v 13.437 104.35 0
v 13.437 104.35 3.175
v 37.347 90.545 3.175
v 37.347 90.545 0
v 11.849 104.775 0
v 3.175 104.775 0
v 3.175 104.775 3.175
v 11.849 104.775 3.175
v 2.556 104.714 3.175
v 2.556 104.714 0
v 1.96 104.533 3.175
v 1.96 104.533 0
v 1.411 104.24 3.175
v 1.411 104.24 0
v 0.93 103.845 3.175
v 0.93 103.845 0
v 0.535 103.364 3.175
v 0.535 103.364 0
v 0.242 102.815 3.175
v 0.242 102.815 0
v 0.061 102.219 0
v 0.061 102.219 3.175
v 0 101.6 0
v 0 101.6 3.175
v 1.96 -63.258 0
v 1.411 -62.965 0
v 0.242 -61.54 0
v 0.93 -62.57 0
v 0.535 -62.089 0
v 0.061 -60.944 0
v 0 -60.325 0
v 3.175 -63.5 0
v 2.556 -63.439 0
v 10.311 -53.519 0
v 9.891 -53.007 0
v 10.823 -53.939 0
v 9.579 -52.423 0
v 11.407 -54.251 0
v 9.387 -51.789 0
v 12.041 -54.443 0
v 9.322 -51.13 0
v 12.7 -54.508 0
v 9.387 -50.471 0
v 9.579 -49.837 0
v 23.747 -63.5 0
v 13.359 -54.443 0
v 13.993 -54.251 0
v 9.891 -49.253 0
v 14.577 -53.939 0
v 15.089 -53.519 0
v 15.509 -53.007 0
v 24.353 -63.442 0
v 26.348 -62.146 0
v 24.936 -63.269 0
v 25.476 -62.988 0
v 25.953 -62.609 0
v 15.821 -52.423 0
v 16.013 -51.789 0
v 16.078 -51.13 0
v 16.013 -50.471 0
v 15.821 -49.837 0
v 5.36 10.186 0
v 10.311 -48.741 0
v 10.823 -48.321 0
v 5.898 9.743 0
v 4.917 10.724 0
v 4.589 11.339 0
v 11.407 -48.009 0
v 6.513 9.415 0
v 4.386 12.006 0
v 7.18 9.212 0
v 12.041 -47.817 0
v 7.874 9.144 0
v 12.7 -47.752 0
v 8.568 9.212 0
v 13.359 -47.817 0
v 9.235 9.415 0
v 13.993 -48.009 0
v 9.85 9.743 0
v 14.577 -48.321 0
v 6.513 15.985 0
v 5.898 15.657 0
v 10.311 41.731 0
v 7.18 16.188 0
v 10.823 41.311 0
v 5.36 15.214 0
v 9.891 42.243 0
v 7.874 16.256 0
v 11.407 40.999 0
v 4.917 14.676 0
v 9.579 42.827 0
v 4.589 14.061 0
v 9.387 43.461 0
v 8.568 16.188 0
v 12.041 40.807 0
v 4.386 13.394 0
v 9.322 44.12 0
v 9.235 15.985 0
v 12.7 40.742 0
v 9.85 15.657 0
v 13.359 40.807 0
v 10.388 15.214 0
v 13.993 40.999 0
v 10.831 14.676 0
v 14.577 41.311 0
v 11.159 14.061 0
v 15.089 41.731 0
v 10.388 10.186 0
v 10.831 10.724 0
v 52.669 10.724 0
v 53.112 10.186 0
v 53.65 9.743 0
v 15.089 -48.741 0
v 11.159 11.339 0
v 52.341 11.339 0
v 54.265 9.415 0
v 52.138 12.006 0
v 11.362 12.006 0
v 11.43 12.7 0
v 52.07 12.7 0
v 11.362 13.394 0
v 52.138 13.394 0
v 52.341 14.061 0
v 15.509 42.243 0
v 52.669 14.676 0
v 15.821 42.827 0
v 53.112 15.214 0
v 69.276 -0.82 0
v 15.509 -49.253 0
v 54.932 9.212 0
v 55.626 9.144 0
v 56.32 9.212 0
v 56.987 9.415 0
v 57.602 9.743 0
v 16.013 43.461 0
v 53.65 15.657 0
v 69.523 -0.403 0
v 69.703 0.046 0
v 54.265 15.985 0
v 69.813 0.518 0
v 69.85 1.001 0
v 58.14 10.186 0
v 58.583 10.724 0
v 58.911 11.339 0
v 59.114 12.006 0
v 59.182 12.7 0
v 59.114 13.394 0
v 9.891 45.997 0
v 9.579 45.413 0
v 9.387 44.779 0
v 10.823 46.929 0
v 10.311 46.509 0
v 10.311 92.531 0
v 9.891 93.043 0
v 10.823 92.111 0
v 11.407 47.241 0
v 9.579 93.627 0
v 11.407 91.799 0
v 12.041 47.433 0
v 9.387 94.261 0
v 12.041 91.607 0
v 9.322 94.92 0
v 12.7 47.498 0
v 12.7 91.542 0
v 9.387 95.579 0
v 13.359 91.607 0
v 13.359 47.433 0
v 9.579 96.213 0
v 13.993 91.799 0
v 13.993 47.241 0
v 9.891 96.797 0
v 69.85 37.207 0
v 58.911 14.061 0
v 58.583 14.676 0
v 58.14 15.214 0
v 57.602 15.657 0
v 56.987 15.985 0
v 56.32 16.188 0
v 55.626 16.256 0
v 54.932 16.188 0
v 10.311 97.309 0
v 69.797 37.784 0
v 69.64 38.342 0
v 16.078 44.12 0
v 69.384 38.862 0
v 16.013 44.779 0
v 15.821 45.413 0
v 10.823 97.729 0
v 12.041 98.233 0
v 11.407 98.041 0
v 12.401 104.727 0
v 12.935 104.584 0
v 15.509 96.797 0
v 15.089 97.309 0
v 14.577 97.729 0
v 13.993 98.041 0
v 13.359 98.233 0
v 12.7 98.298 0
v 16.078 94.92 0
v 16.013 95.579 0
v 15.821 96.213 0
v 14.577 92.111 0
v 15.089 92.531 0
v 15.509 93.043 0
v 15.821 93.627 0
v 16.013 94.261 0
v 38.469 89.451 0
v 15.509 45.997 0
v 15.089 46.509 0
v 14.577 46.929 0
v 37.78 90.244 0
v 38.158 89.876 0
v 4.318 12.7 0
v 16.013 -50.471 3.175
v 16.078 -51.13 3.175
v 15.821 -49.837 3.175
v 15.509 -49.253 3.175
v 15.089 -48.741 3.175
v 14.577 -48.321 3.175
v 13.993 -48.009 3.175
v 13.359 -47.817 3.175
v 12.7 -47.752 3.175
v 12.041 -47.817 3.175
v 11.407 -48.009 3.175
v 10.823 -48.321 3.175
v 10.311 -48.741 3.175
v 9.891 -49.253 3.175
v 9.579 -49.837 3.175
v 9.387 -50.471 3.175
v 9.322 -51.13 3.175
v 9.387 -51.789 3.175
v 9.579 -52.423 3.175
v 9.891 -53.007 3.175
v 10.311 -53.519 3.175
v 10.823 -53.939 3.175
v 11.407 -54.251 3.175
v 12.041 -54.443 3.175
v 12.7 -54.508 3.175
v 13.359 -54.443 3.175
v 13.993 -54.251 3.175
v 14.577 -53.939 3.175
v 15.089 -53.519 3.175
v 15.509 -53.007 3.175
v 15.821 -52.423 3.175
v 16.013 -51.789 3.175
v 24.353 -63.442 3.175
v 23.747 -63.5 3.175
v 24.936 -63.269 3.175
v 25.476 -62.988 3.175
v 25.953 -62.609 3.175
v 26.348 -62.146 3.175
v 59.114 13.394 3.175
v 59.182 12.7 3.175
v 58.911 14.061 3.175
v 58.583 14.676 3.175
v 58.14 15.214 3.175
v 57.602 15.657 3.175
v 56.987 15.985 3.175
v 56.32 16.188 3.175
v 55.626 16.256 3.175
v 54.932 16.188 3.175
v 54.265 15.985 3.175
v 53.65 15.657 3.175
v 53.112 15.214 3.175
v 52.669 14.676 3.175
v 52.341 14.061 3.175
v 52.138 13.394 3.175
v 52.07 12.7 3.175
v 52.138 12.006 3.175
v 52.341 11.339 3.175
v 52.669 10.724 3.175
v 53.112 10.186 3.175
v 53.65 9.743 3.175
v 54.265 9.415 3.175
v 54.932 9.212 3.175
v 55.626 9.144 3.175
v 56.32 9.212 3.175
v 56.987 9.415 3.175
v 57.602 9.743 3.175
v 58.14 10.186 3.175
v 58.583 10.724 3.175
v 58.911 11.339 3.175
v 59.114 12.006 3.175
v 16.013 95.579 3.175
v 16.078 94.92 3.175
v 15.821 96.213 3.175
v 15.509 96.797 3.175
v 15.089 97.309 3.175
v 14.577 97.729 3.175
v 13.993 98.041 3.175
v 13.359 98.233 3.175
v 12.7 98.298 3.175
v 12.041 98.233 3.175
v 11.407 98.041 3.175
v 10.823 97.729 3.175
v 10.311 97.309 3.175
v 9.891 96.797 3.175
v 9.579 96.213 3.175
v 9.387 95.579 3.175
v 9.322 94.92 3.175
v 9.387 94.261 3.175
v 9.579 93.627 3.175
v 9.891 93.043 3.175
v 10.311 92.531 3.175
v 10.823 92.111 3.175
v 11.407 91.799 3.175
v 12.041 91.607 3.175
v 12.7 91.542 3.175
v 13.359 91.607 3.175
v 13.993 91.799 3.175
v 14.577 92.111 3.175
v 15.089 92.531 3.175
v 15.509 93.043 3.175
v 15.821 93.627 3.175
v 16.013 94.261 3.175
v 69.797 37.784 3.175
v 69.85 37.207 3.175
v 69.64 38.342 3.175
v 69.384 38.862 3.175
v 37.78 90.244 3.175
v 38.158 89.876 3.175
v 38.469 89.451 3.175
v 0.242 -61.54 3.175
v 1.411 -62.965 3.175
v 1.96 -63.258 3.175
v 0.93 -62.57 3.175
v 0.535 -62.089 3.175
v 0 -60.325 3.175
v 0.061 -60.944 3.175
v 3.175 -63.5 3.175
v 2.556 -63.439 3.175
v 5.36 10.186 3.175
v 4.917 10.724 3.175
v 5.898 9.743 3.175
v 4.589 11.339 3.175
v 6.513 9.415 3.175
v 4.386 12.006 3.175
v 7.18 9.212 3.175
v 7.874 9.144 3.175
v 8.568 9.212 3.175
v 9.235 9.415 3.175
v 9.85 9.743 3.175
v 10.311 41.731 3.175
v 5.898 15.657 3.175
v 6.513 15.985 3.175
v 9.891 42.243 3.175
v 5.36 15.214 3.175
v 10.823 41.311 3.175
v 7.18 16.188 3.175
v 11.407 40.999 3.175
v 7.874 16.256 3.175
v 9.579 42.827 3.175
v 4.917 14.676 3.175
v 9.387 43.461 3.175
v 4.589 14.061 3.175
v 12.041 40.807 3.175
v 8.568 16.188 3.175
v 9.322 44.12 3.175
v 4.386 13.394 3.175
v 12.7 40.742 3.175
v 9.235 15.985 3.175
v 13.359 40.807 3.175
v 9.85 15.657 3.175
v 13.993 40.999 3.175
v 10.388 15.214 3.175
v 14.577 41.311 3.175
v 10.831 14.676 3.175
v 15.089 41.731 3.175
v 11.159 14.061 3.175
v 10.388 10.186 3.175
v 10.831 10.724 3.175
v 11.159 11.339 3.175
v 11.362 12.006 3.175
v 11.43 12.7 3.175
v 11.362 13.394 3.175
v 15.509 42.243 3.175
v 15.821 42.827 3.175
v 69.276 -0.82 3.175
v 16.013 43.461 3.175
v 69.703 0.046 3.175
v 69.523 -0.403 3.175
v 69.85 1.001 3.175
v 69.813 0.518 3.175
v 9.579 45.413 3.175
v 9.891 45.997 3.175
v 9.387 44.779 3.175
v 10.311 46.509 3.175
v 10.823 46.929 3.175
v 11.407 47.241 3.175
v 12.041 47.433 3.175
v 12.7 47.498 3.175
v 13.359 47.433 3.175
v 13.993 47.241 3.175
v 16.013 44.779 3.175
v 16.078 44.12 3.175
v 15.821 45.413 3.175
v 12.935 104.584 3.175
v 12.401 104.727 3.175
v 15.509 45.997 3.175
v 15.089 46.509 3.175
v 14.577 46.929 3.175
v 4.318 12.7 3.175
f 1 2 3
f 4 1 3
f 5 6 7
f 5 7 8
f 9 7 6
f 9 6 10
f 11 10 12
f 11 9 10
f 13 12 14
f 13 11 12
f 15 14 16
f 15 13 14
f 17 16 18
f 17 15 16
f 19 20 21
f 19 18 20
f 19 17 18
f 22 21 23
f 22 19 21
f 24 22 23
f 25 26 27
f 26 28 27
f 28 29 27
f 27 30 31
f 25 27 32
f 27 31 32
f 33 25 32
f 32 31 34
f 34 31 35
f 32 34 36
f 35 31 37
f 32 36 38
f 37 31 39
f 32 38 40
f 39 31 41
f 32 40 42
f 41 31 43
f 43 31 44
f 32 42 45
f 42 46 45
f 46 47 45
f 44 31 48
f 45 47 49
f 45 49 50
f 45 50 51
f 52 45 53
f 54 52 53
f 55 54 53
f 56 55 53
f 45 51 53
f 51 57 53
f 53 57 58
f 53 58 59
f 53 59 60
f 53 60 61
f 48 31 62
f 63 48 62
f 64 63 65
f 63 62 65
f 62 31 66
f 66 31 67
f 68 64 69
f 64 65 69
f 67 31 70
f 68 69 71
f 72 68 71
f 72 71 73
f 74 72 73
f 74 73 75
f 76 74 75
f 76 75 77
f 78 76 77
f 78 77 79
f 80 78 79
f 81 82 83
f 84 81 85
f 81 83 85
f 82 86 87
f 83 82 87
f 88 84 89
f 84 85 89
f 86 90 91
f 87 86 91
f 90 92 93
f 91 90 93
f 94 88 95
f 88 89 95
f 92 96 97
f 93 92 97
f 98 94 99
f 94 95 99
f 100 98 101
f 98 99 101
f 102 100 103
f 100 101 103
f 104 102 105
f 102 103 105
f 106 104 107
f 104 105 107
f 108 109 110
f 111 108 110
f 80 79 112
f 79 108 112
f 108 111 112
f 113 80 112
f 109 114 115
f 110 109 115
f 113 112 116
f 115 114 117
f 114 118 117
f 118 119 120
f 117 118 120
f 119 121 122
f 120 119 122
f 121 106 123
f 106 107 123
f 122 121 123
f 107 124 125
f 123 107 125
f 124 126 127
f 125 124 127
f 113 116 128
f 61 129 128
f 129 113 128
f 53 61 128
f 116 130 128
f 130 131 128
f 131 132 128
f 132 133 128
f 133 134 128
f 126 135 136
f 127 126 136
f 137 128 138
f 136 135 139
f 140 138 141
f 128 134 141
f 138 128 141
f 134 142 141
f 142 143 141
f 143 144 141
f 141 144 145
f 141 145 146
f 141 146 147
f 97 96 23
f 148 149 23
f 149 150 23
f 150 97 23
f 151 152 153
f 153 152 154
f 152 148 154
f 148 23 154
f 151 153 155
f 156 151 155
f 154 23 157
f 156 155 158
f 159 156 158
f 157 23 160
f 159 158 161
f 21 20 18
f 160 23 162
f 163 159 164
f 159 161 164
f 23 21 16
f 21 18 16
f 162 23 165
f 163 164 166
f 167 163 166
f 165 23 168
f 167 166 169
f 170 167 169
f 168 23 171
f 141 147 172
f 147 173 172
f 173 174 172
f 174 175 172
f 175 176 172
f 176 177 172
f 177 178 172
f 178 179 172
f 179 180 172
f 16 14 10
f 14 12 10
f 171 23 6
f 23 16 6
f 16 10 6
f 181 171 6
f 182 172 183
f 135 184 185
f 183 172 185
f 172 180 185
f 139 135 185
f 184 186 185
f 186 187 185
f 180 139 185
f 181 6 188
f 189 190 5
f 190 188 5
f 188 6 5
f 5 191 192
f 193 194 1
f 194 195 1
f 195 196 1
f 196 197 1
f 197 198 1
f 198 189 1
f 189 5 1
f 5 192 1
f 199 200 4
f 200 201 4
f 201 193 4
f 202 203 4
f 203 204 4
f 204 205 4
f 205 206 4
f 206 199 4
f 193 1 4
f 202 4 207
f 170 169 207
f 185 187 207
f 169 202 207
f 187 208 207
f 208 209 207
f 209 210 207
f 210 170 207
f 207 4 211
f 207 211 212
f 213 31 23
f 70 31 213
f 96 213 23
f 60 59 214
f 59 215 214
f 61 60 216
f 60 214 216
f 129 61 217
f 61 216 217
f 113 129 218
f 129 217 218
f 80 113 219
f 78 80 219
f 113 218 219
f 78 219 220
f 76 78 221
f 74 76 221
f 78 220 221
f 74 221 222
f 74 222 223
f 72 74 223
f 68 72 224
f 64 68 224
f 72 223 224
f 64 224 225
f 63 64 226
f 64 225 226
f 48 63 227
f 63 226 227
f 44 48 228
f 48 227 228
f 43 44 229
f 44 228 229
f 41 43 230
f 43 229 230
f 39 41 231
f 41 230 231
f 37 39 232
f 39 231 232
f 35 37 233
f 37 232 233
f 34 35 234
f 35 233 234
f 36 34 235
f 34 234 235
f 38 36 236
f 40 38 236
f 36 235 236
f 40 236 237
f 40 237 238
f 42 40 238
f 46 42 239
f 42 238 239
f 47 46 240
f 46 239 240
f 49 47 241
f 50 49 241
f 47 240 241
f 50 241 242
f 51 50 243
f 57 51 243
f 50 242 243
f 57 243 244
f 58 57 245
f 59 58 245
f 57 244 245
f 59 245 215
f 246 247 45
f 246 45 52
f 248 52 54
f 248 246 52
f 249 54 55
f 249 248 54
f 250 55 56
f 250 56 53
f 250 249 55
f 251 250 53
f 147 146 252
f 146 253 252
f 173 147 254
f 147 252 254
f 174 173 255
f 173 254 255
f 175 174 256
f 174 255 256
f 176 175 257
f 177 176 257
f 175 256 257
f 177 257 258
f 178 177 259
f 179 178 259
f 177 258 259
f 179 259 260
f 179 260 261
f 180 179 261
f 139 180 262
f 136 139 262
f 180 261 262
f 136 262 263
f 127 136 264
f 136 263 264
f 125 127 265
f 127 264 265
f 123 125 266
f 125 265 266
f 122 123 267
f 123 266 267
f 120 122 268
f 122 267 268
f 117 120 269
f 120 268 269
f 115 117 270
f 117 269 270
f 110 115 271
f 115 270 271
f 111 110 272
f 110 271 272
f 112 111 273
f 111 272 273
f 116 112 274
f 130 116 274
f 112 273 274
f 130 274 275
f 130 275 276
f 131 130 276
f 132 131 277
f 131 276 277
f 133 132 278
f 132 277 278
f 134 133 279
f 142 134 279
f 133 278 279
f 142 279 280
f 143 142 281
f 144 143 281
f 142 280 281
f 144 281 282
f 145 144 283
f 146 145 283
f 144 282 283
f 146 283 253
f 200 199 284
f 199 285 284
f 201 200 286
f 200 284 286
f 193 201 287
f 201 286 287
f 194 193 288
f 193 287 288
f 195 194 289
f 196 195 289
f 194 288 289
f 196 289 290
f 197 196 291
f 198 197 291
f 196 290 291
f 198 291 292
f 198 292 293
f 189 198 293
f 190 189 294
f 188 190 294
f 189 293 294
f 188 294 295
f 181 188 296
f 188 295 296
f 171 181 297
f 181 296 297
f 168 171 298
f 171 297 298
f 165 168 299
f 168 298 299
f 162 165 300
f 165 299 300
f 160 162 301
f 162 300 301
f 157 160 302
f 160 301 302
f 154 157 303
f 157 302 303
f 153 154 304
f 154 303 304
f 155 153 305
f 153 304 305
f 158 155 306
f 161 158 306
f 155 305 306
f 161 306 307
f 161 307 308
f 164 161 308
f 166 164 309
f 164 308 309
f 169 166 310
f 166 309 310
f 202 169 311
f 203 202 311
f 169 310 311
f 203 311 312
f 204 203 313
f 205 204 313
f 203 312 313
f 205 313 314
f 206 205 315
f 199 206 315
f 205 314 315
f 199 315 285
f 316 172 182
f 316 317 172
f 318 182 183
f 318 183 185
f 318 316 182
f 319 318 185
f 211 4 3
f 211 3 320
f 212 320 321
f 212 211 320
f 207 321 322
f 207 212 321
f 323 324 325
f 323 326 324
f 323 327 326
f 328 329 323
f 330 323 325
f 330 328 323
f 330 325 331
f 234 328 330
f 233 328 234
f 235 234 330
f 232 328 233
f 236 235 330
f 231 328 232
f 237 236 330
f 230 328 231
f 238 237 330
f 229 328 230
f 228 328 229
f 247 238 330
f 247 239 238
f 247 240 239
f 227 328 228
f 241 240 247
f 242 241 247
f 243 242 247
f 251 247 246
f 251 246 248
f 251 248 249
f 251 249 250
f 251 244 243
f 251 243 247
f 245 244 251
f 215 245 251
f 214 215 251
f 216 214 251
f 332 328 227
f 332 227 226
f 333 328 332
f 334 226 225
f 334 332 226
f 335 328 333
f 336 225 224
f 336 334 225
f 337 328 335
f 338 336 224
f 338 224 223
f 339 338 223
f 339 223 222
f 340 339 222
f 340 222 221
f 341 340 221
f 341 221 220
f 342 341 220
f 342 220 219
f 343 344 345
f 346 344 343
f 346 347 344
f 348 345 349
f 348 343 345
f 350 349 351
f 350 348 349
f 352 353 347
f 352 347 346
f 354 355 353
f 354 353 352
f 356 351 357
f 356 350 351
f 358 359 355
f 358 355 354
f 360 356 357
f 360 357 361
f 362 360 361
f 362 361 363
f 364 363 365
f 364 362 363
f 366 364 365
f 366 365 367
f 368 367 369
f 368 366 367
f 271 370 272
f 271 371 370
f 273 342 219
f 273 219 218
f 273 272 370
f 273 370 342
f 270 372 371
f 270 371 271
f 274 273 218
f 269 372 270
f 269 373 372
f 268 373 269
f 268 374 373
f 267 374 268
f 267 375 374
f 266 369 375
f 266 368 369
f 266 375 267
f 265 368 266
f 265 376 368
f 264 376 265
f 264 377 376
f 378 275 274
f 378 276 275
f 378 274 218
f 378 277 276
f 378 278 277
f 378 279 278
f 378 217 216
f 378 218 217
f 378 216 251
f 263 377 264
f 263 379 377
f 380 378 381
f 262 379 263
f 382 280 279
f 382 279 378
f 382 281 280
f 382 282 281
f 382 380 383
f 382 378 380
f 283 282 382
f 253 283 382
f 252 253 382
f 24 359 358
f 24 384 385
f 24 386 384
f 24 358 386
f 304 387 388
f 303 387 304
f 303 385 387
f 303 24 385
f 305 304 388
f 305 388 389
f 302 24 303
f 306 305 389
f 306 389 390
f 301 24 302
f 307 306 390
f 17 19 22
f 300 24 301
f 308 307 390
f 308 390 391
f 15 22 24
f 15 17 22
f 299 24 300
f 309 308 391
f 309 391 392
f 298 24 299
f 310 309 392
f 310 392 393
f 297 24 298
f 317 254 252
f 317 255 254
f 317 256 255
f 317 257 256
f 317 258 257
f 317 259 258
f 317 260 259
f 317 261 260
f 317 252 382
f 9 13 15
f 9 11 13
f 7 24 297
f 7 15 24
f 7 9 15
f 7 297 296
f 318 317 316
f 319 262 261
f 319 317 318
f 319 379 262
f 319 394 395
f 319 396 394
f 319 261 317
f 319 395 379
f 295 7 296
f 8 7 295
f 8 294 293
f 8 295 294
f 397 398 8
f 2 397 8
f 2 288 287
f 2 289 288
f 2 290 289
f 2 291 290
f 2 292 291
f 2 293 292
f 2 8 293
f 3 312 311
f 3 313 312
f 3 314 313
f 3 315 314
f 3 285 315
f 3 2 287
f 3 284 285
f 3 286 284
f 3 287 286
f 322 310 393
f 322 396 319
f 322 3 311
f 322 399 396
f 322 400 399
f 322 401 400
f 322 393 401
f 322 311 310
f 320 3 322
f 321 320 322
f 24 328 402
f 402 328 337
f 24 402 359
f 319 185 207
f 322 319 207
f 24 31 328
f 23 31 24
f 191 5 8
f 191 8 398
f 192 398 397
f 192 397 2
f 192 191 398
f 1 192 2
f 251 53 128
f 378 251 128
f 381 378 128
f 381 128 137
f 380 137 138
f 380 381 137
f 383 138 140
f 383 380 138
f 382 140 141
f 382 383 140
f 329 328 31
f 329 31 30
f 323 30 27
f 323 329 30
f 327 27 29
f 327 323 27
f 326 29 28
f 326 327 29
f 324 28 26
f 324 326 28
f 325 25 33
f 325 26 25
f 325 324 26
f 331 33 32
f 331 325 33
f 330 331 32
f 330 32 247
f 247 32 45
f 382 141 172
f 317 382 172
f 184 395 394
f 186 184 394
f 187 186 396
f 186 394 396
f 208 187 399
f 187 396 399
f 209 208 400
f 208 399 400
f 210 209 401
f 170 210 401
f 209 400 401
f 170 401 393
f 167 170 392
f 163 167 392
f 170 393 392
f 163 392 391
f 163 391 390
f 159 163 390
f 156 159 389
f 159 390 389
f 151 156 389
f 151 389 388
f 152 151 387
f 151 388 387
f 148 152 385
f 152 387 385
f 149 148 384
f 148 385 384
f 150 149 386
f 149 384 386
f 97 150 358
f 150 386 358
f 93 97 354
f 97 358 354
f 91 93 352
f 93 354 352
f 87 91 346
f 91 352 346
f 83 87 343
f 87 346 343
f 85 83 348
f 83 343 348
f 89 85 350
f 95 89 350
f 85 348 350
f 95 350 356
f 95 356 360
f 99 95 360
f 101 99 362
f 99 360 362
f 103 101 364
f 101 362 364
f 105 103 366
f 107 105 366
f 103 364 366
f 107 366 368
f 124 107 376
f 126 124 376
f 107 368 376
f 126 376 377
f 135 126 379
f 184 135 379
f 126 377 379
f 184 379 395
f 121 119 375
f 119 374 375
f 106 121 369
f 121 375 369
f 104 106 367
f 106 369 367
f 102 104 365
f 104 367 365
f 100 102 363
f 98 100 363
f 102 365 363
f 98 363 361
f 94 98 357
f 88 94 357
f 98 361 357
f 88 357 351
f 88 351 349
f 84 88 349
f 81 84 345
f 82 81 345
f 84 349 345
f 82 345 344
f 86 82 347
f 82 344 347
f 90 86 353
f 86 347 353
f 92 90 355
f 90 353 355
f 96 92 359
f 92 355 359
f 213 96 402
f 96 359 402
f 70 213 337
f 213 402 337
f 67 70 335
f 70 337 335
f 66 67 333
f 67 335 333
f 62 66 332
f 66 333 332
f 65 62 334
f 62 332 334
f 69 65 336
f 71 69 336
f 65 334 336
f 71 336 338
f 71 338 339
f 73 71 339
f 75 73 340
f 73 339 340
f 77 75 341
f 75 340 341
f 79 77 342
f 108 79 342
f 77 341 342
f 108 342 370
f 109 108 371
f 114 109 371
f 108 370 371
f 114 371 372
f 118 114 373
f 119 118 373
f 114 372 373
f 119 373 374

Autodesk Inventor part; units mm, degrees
ref_plane "YZ Plane" through (0, 0, 0) normal (1, 0, 0) x (0, 1, 0)
ref_plane "XZ Plane" through (0, 0, 0) normal (0, 1, 0) x (-1, 0, 0)
ref_plane "XY Plane" through (0, 0, 0) normal (0, 0, 1) x (1, 0, 0)
sketch "Sketch1" plane through (0, 0, 0) normal (0, 0, 1) x (1, 0, 0)
  line L0 (69.85, 0) -> (69.85, 38.1)
  line L1 (69.85, 38.1) -> (29.1042, 104.775)
  line L2 (0, 104.775) -> (0, 0)
  line L3 (0, -63.5) -> (0, 0)
  line L4 (0, 104.775) -> (29.1042, 104.775)
  line L5 (0, -63.5) -> (25.4, -63.5)
  line L6 (25.4, -63.5) -> (69.85, 0)
  dimension "d1" = 38.1
  dimension "d24" = 63.5
  dimension "d25" = 69.85
  dimension "d26" = 69.85
  dimension "d36" = 104.775
  dimension "d38" = 121.43
  dimension "d45" = 25.4
extrude "Extrusion1" add sketch "Sketch1" along normal blind 3.175
sketch "Sketch2" plane through (0, 0, 3.175) normal (0, 0, 1) x (1, 0, 0)
  line L0 (0, 0) -> (69.85, 0) projected
  line L1 (69.85, 0) -> (69.85, 38.1) projected
  line L2 (0, 104.775) -> (0, -63.5) projected
  circle A0 centre (7.874, 12.7) radius 3.556
  circle A1 centre (55.626, 12.7) radius 3.556
  point P0 (0, 152.4)
  dimension "d5" = 7.112
  dimension "d6" = 7.112
  dimension "d7" = 12.7
  dimension "d8" = 12.7
  dimension "d9" = 14.224
  dimension "d11" = 7.874
extrude "Extrusion2" cut sketch "Sketch2" against normal blind 25.4
sketch "Sketch3" plane through (0, 0, 3.175) normal (0, 0, 1) x (1, 0, 0)
  line L0 (0, 104.775) -> (0, -63.5) projected
  line L1 (0, 0) -> (69.85, 0) projected
  circle A0 centre (12.7, 94.9198) radius 3.3782
  circle A1 centre (12.7, 44.1198) radius 3.3782
  point P0 (0, 141.1158)
  dimension "d15" = 6.7564
  dimension "d16" = 6.7564
  dimension "d17" = 12.7
  dimension "d18" = 12.7
  dimension "d19" = 44.1198
  dimension "d20" = 50.8
extrude "Extrusion3" cut sketch "Sketch3" against normal blind 25.4
fillet "Fillet2" radius 3.175 2 edges at (69.85, 0, 1.5875) (69.85, 38.1, 1.5875)
fillet "Fillet3" radius 3.175 1 edges at (0, -63.5, 1.5875)
sketch "Sketch4" plane through (0, 0, 3.175) normal (0, 0, 1) x (1, 0, 0)
  line L0 (0, 104.775) -> (0, -60.325) projected
  circle A0 centre (12.7, 44.1198) radius 3.3782 projected
  circle A1 centre (12.7, -51.1302) radius 3.3782
  point P0 (0, 141.1158)
  point P1 (0, 0)
  dimension "d28" = 6.7564
  dimension "d29" = 95.25
  dimension "d30" = 12.7
extrude "Extrusion4" cut sketch "Sketch4" against normal blind 25.4 contours A1
sketch "Sketch5" plane through (0, 0, 3.175) normal (0, 0, 1) x (1, 0, 0)
  circle A0 centre (12.7, 44.1198) radius 3.3782 projected
  circle A1 centre (12.7, 94.9198) radius 3.3782 projected
  point P0 (0, 0)
extrude "Extrusion5" cut sketch "Sketch5" against normal blind 25.4
fillet "Fillet4" radius 3.175 2 edges at (29.1042, 104.775, 1.5875) (0, 104.775, 1.5875)
sketch "Sketch6" plane through (0, 0, 3.175) normal (0, 0, 1) x (1, 0, 0)
  line L0 (0, 101.6) -> (0, -60.325) projected
  line L1 (69.3842, 38.8623) -> (30.0327, 103.2556) projected
  arc A0 (30.0327, 103.2556) -> (27.3235, 104.775) centre (27.3235, 101.6) ccw projected
  line L2 (27.3235, 104.775) -> (3.175, 104.775) projected
  line L3 (12.7, 104.775) -> (38.0473, 90.1407)
  point P0 (0, 0)
  dimension "d40" = 30
  dimension "d41" = 12.7
extrude "Extrusion6" cut sketch "Sketch6" against normal blind 25.4
fillet "Fillet5" radius 3.175 2 edges at (12.7, 104.775, 1.5875) (38.0473, 90.1407, 1.5875)
fillet "Fillet6" radius 3.175 1 edges at (25.4, -63.5, 1.5875)
properties part number "Ninja left cylinder support bracket"
